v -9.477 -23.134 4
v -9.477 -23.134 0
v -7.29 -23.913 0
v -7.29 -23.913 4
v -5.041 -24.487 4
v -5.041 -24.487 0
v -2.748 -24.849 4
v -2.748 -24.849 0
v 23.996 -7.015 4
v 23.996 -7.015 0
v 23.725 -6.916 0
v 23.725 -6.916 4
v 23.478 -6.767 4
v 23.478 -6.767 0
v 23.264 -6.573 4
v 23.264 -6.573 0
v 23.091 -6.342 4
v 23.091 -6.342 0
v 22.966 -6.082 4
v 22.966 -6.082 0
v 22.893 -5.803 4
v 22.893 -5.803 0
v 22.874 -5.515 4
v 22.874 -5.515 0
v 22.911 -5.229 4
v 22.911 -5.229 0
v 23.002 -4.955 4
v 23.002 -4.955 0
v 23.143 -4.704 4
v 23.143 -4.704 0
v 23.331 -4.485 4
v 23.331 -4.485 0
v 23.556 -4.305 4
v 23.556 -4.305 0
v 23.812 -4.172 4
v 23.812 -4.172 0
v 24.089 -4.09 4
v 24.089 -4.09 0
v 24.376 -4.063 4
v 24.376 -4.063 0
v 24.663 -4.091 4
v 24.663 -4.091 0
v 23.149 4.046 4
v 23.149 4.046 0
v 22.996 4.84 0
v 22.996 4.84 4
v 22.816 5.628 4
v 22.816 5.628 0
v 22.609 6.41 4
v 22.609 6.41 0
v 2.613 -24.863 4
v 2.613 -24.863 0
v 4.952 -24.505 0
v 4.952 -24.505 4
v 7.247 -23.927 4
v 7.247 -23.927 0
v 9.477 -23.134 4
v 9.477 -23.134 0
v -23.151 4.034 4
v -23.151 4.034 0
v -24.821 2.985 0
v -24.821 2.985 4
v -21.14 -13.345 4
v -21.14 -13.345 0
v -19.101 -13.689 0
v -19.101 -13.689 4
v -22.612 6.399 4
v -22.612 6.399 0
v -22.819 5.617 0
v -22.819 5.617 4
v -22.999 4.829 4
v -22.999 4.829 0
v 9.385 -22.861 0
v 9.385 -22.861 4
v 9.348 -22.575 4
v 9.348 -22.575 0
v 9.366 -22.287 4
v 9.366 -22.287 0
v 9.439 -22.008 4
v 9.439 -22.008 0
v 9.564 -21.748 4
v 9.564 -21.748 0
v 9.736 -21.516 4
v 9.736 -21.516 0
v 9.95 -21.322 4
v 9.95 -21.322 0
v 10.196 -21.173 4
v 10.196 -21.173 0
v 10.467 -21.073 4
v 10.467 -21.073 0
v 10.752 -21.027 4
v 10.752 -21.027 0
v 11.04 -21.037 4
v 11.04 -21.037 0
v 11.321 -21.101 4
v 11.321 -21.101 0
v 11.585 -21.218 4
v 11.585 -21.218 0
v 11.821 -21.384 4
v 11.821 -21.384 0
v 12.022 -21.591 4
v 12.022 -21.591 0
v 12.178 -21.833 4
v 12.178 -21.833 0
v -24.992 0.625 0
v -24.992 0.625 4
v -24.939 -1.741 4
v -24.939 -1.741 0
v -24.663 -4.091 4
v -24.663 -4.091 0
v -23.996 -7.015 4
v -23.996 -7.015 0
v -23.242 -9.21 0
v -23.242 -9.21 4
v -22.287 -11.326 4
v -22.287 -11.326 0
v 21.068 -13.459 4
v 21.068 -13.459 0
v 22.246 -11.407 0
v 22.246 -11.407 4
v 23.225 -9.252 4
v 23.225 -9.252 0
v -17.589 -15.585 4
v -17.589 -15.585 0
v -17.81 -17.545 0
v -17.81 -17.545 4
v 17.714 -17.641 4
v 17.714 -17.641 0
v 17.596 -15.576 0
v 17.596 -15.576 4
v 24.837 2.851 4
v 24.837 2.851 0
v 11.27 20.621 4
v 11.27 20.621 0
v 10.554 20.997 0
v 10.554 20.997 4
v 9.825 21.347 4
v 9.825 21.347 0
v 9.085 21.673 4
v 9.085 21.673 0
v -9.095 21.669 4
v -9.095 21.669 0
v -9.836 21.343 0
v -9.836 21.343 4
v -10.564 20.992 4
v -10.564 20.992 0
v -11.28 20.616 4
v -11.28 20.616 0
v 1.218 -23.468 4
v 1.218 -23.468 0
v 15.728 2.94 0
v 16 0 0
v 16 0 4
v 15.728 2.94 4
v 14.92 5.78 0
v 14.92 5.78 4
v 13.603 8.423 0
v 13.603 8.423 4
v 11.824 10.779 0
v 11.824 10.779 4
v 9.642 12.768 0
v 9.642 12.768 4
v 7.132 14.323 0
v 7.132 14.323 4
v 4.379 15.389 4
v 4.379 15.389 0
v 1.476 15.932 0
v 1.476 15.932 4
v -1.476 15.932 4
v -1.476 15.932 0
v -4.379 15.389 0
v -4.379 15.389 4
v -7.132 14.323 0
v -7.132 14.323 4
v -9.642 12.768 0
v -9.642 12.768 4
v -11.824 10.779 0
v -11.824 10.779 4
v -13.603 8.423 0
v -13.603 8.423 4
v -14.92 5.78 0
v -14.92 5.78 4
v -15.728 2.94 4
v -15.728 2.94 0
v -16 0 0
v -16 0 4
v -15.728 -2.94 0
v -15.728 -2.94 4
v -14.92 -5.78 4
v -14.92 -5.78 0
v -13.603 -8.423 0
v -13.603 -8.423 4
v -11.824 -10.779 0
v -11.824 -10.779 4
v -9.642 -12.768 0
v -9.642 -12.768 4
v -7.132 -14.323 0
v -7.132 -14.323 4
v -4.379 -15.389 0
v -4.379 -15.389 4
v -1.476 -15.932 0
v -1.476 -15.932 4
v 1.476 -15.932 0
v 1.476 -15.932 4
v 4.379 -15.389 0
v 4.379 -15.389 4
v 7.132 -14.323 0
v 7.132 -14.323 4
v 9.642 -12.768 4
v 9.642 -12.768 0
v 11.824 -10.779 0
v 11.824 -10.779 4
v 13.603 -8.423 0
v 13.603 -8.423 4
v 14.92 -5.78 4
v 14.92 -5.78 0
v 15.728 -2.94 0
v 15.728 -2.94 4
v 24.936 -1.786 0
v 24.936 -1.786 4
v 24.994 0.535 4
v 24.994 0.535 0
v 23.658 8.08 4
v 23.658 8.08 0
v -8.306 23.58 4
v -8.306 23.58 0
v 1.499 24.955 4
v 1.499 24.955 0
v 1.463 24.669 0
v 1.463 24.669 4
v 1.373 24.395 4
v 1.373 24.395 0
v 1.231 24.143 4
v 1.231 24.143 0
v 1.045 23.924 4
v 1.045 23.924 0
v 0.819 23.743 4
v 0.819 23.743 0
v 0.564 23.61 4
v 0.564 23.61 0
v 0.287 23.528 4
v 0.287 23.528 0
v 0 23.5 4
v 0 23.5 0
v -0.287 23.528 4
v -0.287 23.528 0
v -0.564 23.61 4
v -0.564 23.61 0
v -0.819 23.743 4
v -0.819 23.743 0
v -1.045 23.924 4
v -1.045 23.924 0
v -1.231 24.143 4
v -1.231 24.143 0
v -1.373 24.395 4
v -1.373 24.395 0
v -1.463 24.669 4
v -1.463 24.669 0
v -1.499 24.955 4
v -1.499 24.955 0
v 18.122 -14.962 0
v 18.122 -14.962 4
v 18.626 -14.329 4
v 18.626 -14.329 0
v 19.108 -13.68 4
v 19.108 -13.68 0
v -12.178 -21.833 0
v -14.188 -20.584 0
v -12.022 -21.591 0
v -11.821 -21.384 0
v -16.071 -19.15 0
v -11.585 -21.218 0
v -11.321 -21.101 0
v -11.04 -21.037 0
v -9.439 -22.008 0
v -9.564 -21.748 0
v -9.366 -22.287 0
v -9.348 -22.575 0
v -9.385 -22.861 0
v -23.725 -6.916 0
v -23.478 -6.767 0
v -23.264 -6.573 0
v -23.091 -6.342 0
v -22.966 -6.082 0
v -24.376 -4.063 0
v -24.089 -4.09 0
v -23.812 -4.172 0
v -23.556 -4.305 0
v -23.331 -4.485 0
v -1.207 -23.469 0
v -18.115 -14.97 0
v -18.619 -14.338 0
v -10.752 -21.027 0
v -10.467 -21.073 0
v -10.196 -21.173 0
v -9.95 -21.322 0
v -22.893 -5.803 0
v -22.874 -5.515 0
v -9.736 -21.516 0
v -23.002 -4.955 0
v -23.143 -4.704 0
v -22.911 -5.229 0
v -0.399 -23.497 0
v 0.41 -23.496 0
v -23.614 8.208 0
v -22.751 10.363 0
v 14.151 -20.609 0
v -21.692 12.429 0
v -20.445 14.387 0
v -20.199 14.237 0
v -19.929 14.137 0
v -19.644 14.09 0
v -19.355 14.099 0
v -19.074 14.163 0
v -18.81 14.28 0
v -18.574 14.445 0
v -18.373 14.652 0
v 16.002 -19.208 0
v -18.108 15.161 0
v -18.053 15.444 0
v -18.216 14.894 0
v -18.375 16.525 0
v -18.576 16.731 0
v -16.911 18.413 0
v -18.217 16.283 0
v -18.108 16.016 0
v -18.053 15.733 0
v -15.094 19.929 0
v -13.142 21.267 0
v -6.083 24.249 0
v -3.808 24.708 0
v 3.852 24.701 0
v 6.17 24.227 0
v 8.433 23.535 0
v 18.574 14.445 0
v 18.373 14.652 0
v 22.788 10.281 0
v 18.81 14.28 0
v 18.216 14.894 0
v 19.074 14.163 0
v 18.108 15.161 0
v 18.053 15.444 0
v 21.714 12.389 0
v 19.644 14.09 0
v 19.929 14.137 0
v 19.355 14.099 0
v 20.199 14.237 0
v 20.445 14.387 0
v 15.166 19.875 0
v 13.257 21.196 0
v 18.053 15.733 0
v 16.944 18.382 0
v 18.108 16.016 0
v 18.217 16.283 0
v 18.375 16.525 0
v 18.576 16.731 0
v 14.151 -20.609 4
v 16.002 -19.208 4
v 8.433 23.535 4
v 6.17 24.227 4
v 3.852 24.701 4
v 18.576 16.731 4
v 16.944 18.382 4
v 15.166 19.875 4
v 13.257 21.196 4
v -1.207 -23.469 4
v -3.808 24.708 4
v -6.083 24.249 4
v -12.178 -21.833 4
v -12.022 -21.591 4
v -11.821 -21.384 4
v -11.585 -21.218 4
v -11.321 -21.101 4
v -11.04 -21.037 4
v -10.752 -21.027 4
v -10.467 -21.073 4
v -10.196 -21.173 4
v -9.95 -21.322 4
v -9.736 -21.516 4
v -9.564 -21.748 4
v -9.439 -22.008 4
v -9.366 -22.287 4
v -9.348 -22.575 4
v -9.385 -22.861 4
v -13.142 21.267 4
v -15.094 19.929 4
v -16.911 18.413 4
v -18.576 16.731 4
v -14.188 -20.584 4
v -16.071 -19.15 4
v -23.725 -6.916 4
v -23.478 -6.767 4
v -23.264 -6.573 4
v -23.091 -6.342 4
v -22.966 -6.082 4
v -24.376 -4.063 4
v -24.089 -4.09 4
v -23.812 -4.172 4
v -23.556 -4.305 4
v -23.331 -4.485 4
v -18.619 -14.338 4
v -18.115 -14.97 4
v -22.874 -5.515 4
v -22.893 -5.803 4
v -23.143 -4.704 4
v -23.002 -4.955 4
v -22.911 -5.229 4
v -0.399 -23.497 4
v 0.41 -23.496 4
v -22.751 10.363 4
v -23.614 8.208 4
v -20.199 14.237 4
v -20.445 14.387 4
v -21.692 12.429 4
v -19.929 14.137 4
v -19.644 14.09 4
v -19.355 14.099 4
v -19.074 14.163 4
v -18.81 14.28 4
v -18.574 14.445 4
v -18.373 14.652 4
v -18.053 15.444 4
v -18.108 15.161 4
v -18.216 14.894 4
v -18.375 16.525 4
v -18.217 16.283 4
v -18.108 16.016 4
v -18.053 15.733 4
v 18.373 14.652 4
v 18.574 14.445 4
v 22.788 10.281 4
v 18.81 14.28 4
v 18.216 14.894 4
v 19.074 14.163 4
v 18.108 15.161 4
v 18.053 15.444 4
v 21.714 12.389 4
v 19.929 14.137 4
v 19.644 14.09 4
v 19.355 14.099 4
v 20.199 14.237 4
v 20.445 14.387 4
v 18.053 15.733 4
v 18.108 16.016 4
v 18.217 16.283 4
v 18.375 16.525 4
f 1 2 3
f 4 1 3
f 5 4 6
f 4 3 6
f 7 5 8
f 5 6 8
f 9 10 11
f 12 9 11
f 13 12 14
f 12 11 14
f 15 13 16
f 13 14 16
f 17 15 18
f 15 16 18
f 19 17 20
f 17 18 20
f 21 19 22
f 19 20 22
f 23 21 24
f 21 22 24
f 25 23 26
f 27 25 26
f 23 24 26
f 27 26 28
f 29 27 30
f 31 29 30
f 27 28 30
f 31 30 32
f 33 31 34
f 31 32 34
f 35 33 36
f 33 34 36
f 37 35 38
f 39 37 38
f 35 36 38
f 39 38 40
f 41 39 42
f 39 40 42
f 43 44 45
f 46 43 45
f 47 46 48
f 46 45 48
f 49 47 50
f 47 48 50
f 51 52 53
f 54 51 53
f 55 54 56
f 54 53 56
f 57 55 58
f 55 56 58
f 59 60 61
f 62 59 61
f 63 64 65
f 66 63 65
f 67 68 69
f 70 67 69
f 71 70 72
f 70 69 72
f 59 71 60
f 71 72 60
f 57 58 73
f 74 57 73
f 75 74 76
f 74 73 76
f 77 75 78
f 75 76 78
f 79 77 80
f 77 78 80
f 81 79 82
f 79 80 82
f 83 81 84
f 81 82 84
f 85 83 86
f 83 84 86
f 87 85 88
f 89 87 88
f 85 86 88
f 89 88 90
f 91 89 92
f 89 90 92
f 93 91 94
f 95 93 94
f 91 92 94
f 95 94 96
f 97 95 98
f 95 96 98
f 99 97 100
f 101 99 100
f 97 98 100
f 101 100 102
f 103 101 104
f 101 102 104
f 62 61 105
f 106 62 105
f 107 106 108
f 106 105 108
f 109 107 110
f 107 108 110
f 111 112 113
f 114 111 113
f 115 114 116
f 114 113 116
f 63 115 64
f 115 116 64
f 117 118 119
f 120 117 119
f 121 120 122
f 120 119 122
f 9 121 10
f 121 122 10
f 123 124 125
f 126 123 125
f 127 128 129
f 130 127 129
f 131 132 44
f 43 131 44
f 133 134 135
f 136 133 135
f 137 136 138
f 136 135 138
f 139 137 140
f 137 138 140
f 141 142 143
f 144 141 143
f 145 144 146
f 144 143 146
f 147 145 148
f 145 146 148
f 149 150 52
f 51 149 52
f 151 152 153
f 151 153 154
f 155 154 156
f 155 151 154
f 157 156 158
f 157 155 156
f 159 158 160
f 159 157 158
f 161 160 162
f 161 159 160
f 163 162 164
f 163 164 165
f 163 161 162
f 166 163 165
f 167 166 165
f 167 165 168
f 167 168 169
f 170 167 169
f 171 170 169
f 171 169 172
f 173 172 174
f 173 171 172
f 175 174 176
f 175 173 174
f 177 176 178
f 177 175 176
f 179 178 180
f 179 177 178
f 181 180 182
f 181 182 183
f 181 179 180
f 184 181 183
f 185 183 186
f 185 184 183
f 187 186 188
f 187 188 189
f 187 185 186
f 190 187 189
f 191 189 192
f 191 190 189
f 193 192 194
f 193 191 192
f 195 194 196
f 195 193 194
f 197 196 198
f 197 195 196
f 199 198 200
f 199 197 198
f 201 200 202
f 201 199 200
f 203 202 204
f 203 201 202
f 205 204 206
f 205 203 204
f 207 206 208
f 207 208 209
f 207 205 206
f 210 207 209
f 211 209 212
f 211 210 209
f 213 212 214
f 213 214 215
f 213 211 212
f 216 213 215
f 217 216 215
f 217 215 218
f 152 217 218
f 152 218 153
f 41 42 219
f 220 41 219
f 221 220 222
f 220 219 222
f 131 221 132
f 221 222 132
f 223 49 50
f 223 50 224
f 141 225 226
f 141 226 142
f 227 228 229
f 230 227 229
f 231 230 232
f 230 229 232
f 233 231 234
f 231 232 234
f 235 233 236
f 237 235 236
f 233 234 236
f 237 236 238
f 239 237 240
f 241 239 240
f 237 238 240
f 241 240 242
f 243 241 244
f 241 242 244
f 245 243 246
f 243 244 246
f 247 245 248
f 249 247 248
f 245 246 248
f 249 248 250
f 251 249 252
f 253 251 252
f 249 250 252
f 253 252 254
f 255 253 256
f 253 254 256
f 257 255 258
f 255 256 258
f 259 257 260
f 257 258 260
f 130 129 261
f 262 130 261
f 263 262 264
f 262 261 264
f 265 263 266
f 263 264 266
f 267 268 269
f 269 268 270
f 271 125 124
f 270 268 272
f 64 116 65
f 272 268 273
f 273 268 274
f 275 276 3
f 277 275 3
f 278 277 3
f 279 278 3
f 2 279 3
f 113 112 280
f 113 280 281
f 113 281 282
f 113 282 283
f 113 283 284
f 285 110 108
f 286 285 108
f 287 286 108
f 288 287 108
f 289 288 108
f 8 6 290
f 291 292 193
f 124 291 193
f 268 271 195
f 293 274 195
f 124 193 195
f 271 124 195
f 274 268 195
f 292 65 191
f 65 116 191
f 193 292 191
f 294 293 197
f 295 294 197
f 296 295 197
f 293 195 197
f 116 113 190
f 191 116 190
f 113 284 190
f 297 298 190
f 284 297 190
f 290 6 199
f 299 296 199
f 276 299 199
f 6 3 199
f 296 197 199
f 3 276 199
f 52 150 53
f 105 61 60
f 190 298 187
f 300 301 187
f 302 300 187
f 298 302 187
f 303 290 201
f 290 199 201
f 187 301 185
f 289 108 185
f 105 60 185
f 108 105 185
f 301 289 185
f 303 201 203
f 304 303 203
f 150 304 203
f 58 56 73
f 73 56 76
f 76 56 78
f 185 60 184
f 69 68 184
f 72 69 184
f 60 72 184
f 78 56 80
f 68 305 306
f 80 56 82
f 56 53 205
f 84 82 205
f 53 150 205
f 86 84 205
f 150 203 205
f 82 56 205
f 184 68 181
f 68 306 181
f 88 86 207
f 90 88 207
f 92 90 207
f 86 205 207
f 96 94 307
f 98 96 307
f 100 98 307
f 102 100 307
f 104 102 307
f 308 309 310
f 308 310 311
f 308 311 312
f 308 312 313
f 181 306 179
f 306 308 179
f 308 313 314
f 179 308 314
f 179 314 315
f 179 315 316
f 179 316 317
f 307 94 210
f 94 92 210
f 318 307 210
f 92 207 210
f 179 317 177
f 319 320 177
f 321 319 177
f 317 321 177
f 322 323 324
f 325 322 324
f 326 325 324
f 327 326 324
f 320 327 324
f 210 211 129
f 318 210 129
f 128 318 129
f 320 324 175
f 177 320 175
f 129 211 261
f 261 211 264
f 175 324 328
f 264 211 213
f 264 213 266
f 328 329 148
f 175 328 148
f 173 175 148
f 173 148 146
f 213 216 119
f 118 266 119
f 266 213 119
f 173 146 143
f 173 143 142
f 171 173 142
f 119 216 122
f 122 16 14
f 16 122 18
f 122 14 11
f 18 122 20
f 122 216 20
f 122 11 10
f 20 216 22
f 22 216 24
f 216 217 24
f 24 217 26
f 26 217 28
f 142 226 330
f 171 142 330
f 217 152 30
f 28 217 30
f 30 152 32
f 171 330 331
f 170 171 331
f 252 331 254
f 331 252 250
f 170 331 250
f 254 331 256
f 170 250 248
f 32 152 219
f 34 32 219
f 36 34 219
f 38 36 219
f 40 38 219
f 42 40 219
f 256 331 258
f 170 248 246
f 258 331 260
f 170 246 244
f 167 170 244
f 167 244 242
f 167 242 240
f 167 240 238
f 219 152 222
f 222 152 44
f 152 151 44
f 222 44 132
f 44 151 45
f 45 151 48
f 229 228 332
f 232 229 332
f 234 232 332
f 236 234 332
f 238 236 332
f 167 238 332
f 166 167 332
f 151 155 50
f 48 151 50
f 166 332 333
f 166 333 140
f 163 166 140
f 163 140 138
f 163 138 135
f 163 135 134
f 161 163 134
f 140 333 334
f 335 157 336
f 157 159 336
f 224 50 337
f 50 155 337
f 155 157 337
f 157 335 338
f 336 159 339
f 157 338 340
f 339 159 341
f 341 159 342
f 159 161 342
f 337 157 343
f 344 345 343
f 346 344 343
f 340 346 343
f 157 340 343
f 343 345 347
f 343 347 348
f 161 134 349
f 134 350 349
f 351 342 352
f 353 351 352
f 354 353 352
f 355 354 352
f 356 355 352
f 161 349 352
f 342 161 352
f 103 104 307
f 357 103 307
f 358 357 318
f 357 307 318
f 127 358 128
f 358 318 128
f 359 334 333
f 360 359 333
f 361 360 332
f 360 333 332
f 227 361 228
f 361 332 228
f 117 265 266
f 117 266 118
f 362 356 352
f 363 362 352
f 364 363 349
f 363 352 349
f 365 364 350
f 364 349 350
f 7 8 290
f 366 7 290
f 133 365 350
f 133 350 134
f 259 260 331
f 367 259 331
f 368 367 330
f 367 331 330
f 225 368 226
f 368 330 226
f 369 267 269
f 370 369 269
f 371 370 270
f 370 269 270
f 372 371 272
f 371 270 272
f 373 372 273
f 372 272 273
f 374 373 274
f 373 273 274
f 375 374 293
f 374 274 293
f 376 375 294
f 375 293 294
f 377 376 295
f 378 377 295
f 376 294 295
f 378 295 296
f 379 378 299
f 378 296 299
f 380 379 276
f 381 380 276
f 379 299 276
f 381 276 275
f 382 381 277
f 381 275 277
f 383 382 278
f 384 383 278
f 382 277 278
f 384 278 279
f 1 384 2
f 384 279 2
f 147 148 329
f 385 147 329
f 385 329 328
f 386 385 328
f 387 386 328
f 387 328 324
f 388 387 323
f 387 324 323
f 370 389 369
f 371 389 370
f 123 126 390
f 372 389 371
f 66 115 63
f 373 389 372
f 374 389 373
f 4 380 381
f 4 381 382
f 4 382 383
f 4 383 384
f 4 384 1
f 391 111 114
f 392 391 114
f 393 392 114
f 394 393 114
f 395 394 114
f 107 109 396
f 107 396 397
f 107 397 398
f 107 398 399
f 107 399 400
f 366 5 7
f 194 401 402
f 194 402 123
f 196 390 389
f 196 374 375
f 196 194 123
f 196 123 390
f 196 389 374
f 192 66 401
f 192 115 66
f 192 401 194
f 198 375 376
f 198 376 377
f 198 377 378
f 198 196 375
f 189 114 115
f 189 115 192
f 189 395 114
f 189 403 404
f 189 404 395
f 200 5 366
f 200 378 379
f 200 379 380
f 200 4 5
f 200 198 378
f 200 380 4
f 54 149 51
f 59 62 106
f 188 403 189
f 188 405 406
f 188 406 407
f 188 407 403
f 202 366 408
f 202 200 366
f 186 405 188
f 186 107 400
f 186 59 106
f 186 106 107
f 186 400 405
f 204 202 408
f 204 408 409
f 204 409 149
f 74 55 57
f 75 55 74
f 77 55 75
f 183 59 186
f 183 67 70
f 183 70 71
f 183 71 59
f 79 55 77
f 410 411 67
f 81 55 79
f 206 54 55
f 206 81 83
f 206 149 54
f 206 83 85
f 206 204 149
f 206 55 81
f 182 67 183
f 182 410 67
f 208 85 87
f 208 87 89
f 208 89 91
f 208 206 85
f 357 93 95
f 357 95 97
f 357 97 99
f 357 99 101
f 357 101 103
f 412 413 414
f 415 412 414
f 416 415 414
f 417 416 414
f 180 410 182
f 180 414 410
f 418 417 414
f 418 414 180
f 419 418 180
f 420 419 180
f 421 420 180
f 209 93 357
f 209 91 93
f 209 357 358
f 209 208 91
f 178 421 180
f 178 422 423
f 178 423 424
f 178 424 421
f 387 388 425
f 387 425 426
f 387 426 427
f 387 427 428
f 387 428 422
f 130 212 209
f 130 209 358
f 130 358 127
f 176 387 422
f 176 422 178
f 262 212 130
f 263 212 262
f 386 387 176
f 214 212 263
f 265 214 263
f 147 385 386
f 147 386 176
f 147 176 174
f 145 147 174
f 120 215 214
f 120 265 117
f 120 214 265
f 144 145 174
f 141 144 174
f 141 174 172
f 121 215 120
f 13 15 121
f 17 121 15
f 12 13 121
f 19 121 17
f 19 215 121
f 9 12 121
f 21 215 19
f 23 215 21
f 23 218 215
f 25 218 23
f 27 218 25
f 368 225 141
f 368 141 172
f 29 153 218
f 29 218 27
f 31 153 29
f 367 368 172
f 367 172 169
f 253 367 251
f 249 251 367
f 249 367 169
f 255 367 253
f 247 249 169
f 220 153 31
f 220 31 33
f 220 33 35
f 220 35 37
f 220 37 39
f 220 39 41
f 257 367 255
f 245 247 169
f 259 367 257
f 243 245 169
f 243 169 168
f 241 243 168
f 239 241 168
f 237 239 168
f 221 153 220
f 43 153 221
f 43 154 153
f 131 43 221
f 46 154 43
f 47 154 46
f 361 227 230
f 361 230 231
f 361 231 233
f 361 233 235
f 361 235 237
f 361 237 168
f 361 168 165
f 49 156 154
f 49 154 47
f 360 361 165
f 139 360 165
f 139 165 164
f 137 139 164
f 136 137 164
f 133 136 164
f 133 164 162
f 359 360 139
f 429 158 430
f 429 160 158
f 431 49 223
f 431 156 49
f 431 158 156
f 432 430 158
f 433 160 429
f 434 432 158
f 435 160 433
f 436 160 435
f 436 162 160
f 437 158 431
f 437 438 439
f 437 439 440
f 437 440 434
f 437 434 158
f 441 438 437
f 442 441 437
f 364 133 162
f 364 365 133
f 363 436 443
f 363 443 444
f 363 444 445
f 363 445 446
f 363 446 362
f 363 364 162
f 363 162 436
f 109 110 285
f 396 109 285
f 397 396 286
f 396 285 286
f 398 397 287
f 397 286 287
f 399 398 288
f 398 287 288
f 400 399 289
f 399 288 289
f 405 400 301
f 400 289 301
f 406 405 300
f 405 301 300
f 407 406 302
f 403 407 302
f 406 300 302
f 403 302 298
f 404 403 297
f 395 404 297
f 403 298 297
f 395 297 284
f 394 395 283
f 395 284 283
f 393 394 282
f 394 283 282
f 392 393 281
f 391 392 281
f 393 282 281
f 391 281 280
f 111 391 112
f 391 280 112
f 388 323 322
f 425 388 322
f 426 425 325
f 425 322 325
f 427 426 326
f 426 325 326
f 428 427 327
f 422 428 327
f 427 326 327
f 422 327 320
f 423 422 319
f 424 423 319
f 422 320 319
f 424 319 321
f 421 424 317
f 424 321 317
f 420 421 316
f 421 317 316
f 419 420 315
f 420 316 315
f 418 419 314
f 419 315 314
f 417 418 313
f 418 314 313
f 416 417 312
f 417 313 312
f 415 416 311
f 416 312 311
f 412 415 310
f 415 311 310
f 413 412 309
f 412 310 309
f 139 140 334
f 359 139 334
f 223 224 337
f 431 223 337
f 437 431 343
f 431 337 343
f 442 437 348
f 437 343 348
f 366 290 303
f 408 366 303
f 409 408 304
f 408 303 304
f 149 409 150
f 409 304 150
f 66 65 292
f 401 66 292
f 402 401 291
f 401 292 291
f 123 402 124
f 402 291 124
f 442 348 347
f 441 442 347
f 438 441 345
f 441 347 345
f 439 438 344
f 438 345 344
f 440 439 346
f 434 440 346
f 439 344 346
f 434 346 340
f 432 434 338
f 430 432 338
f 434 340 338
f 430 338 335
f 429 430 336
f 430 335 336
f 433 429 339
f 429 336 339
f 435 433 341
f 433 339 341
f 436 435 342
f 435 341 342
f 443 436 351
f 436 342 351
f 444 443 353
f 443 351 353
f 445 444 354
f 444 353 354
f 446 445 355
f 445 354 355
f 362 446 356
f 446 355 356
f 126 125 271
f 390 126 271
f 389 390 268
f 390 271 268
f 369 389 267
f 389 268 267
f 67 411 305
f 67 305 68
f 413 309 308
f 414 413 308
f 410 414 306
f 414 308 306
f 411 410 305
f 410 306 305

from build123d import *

# Parameters (mm, degrees)
SKETCH1_R           = 16
BOSS_EXTRUDE1_DEPTH = 4


with BuildPart() as part:
    # Sketch1 → Boss-Extrude1 (new body)
    with BuildSketch(Plane.XY):
        with BuildLine():
            Line((24.836944886, 2.850643567), (23.14914702, 4.045613953))
            ThreePointArc((23.14914702, 4.045613953), (22.909534515, 5.234809289), (22.60887418, 6.410055249))
            Line((22.60887418, 6.410055249), (23.658232882, 8.080100055))
            ThreePointArc((23.658232882, 8.080100055), (22.276156802, 11.347812041), (20.445418397, 14.386968637))
            ThreePointArc((20.445418397, 14.386968637), (18.373039838, 14.652010344), (18.575790893, 16.731407374))
            ThreePointArc((18.575790893, 16.731407374), (16.072080469, 19.149105186), (13.25685896, 21.195652633))
            Line((13.25685896, 21.195652633), (11.270268735, 20.621130974))
            ThreePointArc((11.270268735, 20.621130974), (10.191122428, 21.175245539), (9.084819485, 21.672933694))
            Line((9.084819485, 21.672933694), (8.433390327, 23.534611269))
            ThreePointArc((8.433390327, 23.534611269), (5.01687988, 24.491445778), (1.499324848, 24.955))
            ThreePointArc((1.499324848, 24.955), (0, 23.5), (-1.499324848, 24.955))
            ThreePointArc((-1.499324848, 24.955), (-4.950595028, 24.504930297), (-8.305912153, 23.579902954))
            Line((-8.305912153, 23.579902954), (-9.095351779, 21.668515778))
            ThreePointArc((-9.095351779, 21.668515778), (-10.201412708, 21.170290002), (-11.280289579, 20.615651021))
            Line((-11.280289579, 20.615651021), (-13.141967154, 21.267080179))
            ThreePointArc((-13.141967154, 21.267080179), (-16.020209918, 19.192521309), (-18.575790893, 16.731407374))
            ThreePointArc((-18.575790893, 16.731407374), (-18.373039838, 14.652010344), (-20.445418397, 14.386968637))
            ThreePointArc((-20.445418397, 14.386968637), (-22.245371495, 11.408043085), (-23.614162005, 8.208005408))
            Line((-23.614162005, 8.208005408), (-22.611986892, 6.399066244))
            ThreePointArc((-22.611986892, 6.399066244), (-22.912076004, 5.223674298), (-23.151110514, 4.034362646))
            Line((-23.151110514, 4.034362646), (-24.821155321, 2.985003945))
            ThreePointArc((-24.821155321, 2.985003945), (-24.993754895, -0.558763162), (-24.662957214, -4.091276263))
            ThreePointArc((-24.662957214, -4.091276263), (-22.910805936, -5.229241948), (-23.995694883, -7.014743551))
            ThreePointArc((-23.995694883, -7.014743551), (-22.788929503, -10.279333251), (-21.140466226, -13.344687622))
            Line((-21.140466226, -13.344687622), (-19.101334675, -13.689010689))
            ThreePointArc((-19.101334675, -13.689010689), (-18.369478748, -14.656474696), (-17.588673036, -15.584883087))
            Line((-17.588673036, -15.584883087), (-17.809507272, -17.544841143))
            ThreePointArc((-17.809507272, -17.544841143), (-15.146492656, -19.889287575), (-12.178413721, -21.833145427))
            ThreePointArc((-12.178413721, -21.833145427), (-10.196267869, -21.172768396), (-9.476723699, -23.13421077))
            ThreePointArc((-9.476723699, -23.13421077), (-6.171958786, -24.22616199), (-2.747568192, -24.848558691))
            Line((-2.747568192, -24.848558691), (-1.206987851, -23.468983368))
            ThreePointArc((-1.206987851, -23.468983368), (0.005710674, -23.499999306), (1.218393982, -23.468393982))
            Line((1.218393982, -23.468393982), (2.613063, -24.863063))
            ThreePointArc((2.613063, -24.863063), (6.106387485, -24.242772776), (9.476723699, -23.13421077))
            ThreePointArc((9.476723699, -23.13421077), (10.196267869, -21.172768396), (12.178413721, -21.833145427))
            ThreePointArc((12.178413721, -21.833145427), (15.092622782, -19.930196626), (17.714304731, -17.640958247))
            Line((17.714304731, -17.640958247), (17.596245443, -15.576332891))
            ThreePointArc((17.596245443, -15.576332891), (18.376599843, -14.647545126), (19.107985481, -13.679725541))
            Line((19.107985481, -13.679725541), (21.067943537, -13.458891304))
            ThreePointArc((21.067943537, -13.458891304), (22.761033302, -10.340955615), (23.995694883, -7.014743551))
            ThreePointArc((23.995694883, -7.014743551), (22.910805936, -5.229241948), (24.662957214, -4.091276263))
            ThreePointArc((24.662957214, -4.091276263), (24.992151562, -0.626386701), (24.836944886, 2.850643567))
        make_face()
        Circle(SKETCH1_R, mode=Mode.SUBTRACT)
    extrude(amount=BOSS_EXTRUDE1_DEPTH)


solid = part.part
